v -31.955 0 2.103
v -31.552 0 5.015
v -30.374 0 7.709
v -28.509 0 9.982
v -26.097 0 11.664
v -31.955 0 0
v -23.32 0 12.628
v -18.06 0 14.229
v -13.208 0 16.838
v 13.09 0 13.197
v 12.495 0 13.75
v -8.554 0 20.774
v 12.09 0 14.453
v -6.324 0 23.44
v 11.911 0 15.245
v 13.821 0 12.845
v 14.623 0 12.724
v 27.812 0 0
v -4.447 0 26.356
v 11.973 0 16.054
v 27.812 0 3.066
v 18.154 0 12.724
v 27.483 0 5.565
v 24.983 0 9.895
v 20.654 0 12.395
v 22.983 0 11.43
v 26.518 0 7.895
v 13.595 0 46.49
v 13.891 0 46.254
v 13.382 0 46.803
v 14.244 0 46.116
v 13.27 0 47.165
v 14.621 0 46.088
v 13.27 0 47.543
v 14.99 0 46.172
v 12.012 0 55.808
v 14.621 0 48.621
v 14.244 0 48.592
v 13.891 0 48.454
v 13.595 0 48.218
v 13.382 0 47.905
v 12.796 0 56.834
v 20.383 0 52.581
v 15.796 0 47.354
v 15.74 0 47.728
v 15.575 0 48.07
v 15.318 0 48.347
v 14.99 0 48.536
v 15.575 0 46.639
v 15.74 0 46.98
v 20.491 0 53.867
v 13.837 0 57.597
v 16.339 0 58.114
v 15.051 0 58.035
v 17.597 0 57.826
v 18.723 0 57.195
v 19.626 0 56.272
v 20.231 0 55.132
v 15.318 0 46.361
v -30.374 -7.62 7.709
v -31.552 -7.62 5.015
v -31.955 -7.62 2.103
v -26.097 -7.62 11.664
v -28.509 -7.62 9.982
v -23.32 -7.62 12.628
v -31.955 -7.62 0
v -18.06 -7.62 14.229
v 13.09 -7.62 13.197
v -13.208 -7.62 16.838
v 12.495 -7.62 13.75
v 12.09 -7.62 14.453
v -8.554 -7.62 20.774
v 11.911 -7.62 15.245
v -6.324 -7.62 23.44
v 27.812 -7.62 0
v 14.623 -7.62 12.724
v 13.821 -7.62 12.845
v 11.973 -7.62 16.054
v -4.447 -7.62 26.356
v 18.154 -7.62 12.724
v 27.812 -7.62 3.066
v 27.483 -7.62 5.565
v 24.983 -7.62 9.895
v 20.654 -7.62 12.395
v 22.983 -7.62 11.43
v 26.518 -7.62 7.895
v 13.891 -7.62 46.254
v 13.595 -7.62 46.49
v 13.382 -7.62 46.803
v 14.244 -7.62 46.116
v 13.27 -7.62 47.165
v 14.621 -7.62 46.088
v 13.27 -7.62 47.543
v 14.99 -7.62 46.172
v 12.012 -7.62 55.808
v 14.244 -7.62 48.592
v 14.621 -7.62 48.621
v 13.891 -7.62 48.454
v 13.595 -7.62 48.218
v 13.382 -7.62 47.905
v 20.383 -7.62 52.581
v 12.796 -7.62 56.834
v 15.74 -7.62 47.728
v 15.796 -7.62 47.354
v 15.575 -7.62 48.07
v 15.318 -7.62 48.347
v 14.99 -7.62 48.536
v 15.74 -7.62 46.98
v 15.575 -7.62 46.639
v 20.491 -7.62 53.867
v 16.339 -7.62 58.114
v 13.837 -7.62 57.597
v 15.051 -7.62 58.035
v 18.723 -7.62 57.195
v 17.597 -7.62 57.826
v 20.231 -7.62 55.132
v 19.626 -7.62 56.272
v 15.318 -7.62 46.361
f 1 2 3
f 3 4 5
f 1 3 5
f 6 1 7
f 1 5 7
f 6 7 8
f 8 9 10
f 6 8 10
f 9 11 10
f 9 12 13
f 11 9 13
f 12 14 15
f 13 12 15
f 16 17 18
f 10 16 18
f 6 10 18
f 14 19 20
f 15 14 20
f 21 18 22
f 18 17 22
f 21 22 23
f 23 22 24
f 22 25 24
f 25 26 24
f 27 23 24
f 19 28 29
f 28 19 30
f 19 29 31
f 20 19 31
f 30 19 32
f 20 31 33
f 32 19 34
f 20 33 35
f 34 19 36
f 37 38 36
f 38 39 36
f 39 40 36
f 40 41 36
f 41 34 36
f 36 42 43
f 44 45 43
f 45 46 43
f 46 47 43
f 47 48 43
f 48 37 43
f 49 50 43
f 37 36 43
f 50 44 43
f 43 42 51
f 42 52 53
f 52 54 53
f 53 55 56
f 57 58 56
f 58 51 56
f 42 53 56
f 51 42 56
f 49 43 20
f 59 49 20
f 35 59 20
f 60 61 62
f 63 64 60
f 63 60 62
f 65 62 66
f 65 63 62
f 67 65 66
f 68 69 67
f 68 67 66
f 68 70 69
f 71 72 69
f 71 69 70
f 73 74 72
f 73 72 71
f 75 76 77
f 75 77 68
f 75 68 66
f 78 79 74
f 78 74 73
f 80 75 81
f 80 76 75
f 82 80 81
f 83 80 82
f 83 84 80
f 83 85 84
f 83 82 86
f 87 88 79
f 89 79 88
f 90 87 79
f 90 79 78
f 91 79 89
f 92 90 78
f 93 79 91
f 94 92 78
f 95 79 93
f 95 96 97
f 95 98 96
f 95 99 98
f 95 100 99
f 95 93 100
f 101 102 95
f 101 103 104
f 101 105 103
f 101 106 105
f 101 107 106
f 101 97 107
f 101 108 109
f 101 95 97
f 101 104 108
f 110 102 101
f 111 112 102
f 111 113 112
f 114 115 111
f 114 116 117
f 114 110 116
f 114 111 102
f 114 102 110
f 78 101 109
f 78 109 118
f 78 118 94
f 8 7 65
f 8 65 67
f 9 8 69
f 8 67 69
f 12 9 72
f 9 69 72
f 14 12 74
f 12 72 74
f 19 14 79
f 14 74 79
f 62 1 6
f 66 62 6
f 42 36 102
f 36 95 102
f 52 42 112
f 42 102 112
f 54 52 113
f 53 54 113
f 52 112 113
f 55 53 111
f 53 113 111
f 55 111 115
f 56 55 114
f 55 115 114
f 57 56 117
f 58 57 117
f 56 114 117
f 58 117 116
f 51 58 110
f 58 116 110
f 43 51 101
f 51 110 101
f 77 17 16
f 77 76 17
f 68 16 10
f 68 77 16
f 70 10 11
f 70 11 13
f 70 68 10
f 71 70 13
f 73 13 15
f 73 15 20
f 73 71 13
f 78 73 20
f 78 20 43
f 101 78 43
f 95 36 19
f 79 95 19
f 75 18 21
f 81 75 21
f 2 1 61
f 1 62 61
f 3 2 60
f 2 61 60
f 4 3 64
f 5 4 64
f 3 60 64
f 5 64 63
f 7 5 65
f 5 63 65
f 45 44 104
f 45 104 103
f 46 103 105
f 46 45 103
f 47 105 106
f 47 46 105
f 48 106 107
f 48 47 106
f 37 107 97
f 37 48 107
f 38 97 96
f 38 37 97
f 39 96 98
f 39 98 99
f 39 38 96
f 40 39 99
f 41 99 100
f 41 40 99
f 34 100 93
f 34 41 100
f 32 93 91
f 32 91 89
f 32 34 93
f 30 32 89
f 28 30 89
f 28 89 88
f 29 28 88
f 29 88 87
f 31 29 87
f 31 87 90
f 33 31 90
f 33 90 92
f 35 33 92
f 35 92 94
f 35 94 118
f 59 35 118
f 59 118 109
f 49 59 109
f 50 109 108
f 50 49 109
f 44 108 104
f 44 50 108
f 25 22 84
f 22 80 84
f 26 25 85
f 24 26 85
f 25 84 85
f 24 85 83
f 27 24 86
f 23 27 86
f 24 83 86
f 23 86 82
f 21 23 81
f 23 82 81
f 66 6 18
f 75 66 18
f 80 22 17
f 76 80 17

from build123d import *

# Parameters (mm, degrees)
F0_R     = 1.27
F1_DEPTH = 7.62
F2_R     = 10.731179
F3_R     = 27.853237
F4_R     = 4.531262
F5_R     = 9.658061
F6_R     = 2.719813


with BuildPart() as f1:
    # F0 (on Front) → F1 (new body)
    with BuildSketch(Plane.XZ):
        Polygon((-31.954539, 12.834297), (-31.954539, 0), (0, 0), (27.812107, 0), (27.812107, 12.72366), (11.206285, 12.72366), (27.512231, 83.545011), (-12.00365, 12.834297), align=None)
        with Locations((14.526148, 47.354116)):
            Circle(F0_R, mode=Mode.SUBTRACT)
    extrude(amount=F1_DEPTH)

    # F2
    f2_edges = [f1.edges().sort_by_distance(p)[0] for p in [
        (-31.954539, -3.81, 12.834297),
    ]]
    fillet(f2_edges, radius=F2_R)

    # F3
    f3_edges = [f1.edges().sort_by_distance(p)[0] for p in [
        (-12.00365, -3.81, 12.834297),
    ]]
    fillet(f3_edges, radius=F3_R)

    # F4
    f4_edges = [f1.edges().sort_by_distance(p)[0] for p in [
        (27.512231, -3.81, 83.545011),
    ]]
    fillet(f4_edges, radius=F4_R)

    # F5
    f5_edges = [f1.edges().sort_by_distance(p)[0] for p in [
        (27.812107, -3.81, 12.72366),
    ]]
    fillet(f5_edges, radius=F5_R)

    # F6
    f6_edges = [f1.edges().sort_by_distance(p)[0] for p in [
        (11.206285, -3.81, 12.72366),
    ]]
    fillet(f6_edges, radius=F6_R)


solid = f1.part
